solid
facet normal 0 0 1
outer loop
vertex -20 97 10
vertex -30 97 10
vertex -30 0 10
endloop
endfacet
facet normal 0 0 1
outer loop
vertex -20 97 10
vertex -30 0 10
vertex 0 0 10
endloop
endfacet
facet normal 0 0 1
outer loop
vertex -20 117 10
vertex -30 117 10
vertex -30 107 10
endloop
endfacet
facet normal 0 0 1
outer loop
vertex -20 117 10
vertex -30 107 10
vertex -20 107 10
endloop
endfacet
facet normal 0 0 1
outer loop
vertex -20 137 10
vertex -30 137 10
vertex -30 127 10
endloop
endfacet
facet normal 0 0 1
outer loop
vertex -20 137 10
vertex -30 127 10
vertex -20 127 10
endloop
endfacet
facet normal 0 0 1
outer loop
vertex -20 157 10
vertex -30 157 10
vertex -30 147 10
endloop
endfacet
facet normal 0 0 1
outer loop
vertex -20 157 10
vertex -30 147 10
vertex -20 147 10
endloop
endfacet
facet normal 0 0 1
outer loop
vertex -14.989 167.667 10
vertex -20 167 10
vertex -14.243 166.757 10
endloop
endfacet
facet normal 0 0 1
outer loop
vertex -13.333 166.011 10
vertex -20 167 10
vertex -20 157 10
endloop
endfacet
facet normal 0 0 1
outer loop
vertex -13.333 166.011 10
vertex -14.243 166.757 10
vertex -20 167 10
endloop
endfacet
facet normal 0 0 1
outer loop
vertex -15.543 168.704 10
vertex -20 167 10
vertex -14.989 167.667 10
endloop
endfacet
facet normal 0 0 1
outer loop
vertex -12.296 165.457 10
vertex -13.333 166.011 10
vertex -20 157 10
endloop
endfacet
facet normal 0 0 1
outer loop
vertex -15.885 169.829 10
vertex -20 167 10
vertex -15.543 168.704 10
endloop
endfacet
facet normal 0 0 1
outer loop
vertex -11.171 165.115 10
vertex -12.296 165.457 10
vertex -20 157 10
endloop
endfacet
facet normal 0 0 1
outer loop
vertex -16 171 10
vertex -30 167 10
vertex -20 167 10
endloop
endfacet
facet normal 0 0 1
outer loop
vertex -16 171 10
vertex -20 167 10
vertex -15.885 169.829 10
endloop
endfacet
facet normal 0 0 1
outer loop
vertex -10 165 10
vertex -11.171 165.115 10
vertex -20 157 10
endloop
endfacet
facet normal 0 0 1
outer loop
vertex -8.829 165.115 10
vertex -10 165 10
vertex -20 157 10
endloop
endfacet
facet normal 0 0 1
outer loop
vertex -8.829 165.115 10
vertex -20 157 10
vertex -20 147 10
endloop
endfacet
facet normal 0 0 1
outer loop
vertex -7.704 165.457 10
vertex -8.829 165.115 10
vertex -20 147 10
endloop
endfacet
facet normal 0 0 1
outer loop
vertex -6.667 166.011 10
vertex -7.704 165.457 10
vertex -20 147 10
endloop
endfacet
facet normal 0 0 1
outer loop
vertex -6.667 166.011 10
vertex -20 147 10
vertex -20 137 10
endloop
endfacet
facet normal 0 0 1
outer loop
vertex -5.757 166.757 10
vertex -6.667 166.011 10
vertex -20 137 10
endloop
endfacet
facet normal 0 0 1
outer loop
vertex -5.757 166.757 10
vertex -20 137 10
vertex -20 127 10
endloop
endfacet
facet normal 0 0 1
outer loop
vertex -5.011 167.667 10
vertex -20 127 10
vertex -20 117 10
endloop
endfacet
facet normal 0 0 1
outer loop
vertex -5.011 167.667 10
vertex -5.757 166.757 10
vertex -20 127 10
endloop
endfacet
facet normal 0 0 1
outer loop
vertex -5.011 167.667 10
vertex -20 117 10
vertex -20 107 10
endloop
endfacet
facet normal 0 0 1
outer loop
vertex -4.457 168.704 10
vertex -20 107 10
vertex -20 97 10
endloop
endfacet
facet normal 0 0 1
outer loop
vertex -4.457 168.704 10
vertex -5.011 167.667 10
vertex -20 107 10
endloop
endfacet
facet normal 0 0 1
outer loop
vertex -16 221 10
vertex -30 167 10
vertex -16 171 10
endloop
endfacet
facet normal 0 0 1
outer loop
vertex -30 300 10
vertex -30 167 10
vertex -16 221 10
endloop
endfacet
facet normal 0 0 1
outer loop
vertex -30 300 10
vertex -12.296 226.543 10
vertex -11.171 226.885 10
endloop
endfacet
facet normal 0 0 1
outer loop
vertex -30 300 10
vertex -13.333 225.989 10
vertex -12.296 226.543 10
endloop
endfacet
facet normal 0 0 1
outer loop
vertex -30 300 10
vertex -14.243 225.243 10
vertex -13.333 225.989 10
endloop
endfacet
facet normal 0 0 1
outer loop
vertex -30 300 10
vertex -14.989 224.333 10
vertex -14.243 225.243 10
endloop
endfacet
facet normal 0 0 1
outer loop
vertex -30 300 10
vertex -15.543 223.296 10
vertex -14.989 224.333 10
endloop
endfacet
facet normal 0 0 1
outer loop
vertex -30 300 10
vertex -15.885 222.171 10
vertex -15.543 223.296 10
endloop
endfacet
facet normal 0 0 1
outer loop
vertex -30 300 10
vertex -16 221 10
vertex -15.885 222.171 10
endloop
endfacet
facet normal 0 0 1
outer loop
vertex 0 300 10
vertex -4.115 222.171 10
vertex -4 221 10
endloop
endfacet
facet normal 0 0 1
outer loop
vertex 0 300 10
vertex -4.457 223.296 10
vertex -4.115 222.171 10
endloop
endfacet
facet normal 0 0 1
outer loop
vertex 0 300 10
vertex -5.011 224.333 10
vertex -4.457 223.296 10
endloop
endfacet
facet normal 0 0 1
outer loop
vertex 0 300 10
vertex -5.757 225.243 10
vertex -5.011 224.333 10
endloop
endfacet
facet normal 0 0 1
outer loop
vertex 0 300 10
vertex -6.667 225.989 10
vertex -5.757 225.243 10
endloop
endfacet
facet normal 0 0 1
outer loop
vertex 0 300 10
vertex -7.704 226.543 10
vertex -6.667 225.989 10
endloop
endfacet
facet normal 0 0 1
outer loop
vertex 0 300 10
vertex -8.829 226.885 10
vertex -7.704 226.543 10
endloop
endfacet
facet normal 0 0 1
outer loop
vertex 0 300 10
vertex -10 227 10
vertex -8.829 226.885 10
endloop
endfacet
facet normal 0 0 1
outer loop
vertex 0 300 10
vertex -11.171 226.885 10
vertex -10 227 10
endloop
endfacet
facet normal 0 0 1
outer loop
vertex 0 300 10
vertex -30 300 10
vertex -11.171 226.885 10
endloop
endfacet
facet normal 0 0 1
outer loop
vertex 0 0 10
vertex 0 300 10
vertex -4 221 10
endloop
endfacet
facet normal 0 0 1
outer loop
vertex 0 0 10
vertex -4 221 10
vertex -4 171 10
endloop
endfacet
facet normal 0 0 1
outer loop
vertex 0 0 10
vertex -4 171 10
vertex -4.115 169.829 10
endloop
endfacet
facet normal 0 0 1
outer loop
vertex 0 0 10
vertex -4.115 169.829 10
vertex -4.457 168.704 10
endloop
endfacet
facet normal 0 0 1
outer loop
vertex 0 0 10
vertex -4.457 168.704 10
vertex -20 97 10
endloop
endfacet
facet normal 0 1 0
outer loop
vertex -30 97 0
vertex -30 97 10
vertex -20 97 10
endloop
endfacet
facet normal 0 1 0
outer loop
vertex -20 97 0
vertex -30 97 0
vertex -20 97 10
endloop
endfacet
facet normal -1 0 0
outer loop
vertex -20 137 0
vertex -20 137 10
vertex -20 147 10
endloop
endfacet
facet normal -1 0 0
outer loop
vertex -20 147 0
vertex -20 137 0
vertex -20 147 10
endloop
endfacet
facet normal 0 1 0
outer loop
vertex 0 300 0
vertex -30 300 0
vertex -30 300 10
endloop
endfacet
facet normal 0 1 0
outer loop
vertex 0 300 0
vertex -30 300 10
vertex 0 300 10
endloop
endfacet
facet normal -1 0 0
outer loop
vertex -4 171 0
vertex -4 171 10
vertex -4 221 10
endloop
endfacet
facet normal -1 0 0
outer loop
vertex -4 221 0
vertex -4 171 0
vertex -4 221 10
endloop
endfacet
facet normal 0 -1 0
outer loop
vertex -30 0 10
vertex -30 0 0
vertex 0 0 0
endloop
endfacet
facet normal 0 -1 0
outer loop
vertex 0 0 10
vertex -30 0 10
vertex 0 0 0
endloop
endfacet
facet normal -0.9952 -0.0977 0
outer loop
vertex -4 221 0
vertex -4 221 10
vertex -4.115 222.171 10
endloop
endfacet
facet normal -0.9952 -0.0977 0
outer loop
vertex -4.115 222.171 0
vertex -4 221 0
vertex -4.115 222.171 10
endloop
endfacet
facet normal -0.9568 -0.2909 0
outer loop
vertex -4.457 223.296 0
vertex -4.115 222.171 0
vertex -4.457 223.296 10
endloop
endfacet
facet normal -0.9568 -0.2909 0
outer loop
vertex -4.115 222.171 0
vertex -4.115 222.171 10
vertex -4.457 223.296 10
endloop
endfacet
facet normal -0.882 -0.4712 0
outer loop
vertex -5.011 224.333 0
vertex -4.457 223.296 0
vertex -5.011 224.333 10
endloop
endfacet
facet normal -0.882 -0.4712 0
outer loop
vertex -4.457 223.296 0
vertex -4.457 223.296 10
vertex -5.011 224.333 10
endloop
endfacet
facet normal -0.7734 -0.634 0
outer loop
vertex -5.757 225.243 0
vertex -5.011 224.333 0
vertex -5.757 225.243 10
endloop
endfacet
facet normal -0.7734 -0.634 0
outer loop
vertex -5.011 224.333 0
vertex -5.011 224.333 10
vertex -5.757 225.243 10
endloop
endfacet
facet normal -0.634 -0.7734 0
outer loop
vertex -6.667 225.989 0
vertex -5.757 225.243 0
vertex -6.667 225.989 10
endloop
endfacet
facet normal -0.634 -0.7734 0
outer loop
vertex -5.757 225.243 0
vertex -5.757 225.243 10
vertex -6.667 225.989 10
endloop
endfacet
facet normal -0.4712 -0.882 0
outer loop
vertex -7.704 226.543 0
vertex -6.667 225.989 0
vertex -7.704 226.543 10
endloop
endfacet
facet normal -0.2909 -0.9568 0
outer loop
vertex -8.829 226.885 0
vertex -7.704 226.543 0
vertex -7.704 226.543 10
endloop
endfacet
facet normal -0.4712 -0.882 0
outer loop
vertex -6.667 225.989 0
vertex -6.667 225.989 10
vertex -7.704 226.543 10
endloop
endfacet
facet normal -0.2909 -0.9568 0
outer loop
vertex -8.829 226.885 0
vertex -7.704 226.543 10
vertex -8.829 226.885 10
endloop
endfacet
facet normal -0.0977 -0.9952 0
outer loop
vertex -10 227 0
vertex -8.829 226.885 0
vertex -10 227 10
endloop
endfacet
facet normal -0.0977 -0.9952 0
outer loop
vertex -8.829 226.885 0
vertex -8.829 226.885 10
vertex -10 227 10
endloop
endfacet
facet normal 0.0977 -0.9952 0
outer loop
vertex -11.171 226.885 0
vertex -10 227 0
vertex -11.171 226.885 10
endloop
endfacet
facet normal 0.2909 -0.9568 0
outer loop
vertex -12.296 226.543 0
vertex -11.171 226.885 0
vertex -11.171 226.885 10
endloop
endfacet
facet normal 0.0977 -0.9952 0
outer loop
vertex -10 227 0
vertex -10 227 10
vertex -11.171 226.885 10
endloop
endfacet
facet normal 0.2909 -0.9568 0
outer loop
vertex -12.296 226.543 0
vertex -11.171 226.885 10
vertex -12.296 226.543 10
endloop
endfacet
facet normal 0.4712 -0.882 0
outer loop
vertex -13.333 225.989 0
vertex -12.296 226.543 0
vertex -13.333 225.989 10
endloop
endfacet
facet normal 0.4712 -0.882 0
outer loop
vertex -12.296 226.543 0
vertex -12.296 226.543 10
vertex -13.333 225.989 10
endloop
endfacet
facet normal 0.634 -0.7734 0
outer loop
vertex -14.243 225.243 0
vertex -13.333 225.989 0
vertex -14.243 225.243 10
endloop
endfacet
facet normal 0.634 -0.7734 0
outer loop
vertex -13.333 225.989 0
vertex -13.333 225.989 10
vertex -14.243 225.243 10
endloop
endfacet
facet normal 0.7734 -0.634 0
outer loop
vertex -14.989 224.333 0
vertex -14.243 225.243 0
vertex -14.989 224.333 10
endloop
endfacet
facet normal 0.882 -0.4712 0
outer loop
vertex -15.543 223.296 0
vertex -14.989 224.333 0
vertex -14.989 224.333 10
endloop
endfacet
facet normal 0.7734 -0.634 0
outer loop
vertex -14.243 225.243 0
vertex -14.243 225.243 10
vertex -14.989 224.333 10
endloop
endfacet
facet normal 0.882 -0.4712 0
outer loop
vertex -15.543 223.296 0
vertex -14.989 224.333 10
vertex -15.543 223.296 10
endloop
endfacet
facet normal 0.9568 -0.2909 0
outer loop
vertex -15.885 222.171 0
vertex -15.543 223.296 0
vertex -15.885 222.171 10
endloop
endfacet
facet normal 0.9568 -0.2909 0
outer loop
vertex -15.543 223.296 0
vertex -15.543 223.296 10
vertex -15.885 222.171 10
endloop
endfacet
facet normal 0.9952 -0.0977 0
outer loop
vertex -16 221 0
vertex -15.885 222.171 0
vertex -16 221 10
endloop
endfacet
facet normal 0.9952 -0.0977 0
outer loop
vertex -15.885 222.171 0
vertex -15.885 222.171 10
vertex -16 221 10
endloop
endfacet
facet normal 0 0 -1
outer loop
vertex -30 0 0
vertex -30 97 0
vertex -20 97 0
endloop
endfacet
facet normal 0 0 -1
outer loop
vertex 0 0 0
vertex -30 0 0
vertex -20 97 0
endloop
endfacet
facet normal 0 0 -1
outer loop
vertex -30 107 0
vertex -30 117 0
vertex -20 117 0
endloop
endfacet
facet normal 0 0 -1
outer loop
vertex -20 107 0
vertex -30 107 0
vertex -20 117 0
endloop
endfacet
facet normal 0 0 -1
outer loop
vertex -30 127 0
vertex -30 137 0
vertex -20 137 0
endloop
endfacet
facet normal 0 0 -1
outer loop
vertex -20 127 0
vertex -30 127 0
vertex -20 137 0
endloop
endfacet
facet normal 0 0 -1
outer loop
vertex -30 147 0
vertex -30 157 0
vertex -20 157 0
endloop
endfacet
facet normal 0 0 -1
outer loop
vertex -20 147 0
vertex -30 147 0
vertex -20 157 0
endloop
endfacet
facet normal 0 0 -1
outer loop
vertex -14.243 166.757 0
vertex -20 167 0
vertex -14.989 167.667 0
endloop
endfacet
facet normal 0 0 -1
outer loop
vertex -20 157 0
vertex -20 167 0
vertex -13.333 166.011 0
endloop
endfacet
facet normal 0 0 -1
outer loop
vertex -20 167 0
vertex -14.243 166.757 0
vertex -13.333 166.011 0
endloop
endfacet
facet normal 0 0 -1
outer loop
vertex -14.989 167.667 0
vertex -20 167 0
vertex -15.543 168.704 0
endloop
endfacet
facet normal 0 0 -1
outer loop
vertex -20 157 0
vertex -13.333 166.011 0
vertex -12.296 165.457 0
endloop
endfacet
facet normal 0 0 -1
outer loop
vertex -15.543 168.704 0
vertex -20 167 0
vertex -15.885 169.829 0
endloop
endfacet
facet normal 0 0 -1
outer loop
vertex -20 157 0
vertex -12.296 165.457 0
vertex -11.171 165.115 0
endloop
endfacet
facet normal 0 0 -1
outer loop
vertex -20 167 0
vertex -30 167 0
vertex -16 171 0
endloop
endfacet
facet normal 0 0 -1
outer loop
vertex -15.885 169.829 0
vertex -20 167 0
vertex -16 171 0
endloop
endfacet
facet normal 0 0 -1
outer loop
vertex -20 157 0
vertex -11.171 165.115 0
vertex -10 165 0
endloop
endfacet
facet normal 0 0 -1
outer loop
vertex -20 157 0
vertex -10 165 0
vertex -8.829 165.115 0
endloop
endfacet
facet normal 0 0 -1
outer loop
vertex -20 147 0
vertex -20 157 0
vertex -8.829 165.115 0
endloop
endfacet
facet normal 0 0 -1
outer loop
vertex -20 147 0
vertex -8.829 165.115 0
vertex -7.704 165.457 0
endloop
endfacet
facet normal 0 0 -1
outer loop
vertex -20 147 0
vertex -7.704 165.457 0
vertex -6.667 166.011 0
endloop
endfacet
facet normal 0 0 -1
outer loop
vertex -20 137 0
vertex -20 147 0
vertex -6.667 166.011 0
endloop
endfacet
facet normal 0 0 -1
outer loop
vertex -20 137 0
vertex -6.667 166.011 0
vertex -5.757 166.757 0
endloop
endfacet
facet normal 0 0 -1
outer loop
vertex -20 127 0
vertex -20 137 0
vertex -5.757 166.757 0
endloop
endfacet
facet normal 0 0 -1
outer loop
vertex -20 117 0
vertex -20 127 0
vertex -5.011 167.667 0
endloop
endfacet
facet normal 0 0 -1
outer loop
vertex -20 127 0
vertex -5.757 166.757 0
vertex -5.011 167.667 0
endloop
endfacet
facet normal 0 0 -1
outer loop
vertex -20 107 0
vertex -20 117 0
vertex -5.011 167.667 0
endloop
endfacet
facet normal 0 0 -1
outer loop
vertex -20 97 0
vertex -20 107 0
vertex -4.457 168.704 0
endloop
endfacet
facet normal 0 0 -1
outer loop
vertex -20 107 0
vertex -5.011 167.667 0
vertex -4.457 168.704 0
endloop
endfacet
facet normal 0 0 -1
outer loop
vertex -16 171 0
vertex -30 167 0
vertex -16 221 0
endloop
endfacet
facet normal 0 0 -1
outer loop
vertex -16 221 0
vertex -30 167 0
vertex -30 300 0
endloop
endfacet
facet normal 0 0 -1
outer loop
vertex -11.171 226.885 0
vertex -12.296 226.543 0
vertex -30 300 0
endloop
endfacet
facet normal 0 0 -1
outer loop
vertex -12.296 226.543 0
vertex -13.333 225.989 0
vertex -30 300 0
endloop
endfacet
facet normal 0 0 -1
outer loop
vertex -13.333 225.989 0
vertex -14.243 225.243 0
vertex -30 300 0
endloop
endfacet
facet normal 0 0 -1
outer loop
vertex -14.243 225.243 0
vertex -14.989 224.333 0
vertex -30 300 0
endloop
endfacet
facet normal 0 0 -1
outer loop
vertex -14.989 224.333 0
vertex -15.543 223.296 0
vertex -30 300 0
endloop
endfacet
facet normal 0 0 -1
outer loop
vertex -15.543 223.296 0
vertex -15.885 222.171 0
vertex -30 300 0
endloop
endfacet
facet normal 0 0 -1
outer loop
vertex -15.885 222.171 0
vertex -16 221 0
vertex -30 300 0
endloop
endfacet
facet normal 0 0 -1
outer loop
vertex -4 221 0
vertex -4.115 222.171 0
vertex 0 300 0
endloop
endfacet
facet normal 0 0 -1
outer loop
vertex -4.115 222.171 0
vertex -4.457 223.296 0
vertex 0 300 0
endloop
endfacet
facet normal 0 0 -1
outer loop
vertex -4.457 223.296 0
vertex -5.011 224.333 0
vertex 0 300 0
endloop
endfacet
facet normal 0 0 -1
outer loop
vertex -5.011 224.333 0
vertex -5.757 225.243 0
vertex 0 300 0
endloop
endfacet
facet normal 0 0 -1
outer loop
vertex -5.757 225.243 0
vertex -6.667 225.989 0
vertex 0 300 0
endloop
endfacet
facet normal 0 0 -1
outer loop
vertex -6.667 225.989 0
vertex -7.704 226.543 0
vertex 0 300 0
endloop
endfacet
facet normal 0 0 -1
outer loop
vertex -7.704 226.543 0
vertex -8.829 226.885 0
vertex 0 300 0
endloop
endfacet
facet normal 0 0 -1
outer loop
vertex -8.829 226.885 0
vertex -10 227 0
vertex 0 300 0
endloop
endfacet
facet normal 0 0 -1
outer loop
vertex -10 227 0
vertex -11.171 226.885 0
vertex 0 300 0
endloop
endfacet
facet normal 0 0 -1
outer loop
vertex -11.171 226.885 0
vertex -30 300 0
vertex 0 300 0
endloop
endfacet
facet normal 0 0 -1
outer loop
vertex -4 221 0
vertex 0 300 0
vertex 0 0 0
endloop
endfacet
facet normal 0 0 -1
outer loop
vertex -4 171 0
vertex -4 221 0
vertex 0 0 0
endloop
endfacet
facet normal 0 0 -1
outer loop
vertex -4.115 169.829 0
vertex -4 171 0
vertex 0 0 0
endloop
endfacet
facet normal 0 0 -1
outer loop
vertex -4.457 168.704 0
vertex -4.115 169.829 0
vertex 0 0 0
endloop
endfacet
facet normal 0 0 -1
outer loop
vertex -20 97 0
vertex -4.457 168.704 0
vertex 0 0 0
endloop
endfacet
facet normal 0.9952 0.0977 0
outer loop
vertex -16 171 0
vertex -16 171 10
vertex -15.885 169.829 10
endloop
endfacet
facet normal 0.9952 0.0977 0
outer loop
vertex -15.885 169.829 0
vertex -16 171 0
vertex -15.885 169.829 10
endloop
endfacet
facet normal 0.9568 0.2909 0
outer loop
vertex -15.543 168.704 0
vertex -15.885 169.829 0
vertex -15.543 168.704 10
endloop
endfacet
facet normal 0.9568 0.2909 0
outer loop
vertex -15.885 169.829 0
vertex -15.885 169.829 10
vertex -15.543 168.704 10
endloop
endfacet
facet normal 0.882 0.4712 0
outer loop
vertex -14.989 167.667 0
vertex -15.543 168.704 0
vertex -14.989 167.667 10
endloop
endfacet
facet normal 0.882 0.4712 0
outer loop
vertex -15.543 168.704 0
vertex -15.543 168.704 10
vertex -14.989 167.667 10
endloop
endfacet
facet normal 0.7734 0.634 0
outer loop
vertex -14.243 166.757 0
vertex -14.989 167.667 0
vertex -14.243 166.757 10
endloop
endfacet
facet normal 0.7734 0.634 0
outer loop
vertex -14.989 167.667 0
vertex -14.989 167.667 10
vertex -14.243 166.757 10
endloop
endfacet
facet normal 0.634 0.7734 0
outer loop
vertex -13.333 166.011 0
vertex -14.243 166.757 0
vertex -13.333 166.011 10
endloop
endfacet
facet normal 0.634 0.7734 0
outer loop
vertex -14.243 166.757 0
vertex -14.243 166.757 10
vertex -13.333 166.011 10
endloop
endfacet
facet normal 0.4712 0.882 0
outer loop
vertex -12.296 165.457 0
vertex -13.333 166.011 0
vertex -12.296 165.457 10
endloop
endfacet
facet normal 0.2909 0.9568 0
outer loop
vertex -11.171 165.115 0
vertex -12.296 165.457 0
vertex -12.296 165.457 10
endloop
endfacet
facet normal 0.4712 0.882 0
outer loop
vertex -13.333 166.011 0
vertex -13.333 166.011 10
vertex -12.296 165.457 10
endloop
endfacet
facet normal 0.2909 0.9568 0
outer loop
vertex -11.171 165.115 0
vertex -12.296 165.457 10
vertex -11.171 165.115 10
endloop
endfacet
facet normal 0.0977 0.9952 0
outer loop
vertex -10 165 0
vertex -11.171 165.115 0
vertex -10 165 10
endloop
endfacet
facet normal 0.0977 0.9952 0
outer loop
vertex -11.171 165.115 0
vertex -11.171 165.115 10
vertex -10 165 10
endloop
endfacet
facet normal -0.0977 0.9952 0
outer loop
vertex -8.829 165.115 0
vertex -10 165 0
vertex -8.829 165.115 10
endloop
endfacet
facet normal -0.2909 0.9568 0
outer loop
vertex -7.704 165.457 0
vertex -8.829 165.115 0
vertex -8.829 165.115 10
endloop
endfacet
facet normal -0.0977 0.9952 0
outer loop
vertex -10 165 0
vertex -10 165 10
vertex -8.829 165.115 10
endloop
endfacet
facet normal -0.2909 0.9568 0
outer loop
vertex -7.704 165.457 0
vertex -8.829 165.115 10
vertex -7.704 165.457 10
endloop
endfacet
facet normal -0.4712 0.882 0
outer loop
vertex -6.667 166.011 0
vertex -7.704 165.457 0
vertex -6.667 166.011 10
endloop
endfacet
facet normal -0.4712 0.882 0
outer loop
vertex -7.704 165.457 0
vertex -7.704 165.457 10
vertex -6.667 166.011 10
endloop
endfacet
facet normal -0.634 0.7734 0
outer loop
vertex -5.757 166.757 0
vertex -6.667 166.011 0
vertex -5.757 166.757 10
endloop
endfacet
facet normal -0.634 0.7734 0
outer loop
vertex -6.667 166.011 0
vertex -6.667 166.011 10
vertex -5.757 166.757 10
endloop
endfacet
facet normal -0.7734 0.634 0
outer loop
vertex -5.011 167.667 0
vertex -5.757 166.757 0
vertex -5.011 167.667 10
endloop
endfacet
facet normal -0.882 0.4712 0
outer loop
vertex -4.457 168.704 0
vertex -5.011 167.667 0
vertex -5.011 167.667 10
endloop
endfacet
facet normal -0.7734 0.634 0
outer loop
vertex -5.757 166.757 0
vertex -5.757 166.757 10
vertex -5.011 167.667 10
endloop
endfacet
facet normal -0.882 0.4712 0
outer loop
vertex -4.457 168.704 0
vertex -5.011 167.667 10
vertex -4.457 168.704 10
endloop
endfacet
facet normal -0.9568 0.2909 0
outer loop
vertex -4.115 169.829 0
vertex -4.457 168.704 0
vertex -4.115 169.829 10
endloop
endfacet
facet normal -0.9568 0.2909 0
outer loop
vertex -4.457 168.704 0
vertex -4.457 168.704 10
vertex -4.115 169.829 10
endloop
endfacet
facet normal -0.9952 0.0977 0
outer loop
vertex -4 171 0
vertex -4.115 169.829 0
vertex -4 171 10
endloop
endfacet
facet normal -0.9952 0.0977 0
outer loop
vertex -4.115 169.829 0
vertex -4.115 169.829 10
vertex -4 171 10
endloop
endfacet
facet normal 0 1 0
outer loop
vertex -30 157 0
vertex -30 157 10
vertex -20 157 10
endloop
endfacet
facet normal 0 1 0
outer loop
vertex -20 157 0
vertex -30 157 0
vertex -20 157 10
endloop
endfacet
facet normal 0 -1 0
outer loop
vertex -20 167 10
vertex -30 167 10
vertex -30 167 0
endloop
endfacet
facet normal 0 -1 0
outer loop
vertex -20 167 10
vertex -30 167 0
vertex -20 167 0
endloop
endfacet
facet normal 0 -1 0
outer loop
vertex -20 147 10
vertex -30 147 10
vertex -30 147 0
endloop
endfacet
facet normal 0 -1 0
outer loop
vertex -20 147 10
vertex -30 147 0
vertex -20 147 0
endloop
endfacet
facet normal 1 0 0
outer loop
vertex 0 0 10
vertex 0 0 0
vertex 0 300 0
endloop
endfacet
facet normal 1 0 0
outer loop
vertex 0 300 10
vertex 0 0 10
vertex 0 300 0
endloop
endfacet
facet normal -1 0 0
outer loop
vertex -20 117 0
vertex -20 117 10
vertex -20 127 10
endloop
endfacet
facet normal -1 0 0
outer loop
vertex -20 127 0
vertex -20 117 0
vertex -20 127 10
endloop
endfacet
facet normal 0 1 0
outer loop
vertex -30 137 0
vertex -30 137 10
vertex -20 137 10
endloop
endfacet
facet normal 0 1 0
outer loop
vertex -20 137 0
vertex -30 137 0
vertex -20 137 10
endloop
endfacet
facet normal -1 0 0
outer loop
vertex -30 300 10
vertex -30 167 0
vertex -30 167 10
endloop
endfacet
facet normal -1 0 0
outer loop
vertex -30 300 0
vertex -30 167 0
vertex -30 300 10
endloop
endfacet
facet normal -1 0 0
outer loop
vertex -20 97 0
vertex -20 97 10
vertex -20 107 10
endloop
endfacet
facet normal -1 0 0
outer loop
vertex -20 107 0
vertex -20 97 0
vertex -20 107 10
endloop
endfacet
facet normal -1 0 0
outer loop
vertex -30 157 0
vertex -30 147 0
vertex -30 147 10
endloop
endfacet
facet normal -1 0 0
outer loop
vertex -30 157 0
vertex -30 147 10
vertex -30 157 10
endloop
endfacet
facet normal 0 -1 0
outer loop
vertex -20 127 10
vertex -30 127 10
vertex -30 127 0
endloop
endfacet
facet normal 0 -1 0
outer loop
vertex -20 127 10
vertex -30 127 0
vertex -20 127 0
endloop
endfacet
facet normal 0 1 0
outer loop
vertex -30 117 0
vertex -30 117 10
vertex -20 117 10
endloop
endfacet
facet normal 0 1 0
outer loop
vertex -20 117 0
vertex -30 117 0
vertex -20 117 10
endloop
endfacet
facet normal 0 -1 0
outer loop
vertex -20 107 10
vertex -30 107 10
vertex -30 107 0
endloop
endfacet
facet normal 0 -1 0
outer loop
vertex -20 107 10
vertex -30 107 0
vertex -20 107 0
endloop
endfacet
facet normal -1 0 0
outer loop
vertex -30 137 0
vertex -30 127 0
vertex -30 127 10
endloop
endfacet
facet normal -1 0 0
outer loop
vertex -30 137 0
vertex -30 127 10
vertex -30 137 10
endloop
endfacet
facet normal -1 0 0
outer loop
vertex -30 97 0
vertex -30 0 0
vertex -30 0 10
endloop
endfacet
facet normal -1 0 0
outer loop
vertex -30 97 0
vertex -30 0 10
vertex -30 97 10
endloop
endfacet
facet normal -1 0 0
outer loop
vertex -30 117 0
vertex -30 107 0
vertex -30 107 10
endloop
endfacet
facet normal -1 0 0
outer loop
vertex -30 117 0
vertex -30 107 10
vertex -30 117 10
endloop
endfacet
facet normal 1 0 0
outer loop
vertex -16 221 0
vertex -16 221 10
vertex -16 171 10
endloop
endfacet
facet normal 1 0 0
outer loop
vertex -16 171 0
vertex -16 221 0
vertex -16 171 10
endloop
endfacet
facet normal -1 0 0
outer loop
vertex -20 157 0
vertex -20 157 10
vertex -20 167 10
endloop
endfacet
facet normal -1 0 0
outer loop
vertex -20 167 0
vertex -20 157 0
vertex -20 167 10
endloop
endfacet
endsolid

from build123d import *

# Parameters (mm, degrees)
ESQUISSE1_W                = 30
ESQUISSE1_H                = 300
BOSS_EXTRU_1_DEPTH         = 10
ESQUISSE2_W                = 10
ESQUISSE2_H                = 10
ENL_V_MAT_EXTRU_1_DEPTH    = 10
R_P_TITION_LIN_AIRE1_COUNT = 4
R_P_TITION_LIN_AIRE1_PITCH = 20
ENL_V_MAT_EXTRU_2_DEPTH    = 10


with BuildPart() as part:
    # Esquisse1 → Boss.-Extru.1 (new body)
    with BuildSketch(Plane.XY):
        with Locations((-15, 150)):
            Rectangle(ESQUISSE1_W, ESQUISSE1_H)
    extrude(amount=BOSS_EXTRU_1_DEPTH)

    # Esquisse2 → Enlèv. mat.-Extru.1 (cut)
    with BuildSketch(Plane.XY.offset(10)):
        with Locations((-25, 162)):
            Rectangle(ESQUISSE2_W, ESQUISSE2_H)
    enl_v_mat_extru_1 = extrude(amount=-ENL_V_MAT_EXTRU_1_DEPTH, mode=Mode.SUBTRACT)

    # Répétition linéaire1: Enlèv. mat.-Extru.1 ×4
    with Locations(*[(0, -i * R_P_TITION_LIN_AIRE1_PITCH, 0) for i in range(1, R_P_TITION_LIN_AIRE1_COUNT)]):
        add(enl_v_mat_extru_1, mode=Mode.SUBTRACT)

    # Esquisse3 → Enlèv. mat.-Extru.2 (cut)
    with BuildSketch(Plane.XY.offset(10)):
        with BuildLine():
            Line((-4, 171), (-4, 221))
            ThreePointArc((-4, 221), (-10, 227), (-16, 221))
            Line((-16, 221), (-16, 171))
            ThreePointArc((-16, 171), (-10, 165), (-4, 171))
        make_face()
    extrude(amount=-ENL_V_MAT_EXTRU_2_DEPTH, mode=Mode.SUBTRACT)


solid = part.part
